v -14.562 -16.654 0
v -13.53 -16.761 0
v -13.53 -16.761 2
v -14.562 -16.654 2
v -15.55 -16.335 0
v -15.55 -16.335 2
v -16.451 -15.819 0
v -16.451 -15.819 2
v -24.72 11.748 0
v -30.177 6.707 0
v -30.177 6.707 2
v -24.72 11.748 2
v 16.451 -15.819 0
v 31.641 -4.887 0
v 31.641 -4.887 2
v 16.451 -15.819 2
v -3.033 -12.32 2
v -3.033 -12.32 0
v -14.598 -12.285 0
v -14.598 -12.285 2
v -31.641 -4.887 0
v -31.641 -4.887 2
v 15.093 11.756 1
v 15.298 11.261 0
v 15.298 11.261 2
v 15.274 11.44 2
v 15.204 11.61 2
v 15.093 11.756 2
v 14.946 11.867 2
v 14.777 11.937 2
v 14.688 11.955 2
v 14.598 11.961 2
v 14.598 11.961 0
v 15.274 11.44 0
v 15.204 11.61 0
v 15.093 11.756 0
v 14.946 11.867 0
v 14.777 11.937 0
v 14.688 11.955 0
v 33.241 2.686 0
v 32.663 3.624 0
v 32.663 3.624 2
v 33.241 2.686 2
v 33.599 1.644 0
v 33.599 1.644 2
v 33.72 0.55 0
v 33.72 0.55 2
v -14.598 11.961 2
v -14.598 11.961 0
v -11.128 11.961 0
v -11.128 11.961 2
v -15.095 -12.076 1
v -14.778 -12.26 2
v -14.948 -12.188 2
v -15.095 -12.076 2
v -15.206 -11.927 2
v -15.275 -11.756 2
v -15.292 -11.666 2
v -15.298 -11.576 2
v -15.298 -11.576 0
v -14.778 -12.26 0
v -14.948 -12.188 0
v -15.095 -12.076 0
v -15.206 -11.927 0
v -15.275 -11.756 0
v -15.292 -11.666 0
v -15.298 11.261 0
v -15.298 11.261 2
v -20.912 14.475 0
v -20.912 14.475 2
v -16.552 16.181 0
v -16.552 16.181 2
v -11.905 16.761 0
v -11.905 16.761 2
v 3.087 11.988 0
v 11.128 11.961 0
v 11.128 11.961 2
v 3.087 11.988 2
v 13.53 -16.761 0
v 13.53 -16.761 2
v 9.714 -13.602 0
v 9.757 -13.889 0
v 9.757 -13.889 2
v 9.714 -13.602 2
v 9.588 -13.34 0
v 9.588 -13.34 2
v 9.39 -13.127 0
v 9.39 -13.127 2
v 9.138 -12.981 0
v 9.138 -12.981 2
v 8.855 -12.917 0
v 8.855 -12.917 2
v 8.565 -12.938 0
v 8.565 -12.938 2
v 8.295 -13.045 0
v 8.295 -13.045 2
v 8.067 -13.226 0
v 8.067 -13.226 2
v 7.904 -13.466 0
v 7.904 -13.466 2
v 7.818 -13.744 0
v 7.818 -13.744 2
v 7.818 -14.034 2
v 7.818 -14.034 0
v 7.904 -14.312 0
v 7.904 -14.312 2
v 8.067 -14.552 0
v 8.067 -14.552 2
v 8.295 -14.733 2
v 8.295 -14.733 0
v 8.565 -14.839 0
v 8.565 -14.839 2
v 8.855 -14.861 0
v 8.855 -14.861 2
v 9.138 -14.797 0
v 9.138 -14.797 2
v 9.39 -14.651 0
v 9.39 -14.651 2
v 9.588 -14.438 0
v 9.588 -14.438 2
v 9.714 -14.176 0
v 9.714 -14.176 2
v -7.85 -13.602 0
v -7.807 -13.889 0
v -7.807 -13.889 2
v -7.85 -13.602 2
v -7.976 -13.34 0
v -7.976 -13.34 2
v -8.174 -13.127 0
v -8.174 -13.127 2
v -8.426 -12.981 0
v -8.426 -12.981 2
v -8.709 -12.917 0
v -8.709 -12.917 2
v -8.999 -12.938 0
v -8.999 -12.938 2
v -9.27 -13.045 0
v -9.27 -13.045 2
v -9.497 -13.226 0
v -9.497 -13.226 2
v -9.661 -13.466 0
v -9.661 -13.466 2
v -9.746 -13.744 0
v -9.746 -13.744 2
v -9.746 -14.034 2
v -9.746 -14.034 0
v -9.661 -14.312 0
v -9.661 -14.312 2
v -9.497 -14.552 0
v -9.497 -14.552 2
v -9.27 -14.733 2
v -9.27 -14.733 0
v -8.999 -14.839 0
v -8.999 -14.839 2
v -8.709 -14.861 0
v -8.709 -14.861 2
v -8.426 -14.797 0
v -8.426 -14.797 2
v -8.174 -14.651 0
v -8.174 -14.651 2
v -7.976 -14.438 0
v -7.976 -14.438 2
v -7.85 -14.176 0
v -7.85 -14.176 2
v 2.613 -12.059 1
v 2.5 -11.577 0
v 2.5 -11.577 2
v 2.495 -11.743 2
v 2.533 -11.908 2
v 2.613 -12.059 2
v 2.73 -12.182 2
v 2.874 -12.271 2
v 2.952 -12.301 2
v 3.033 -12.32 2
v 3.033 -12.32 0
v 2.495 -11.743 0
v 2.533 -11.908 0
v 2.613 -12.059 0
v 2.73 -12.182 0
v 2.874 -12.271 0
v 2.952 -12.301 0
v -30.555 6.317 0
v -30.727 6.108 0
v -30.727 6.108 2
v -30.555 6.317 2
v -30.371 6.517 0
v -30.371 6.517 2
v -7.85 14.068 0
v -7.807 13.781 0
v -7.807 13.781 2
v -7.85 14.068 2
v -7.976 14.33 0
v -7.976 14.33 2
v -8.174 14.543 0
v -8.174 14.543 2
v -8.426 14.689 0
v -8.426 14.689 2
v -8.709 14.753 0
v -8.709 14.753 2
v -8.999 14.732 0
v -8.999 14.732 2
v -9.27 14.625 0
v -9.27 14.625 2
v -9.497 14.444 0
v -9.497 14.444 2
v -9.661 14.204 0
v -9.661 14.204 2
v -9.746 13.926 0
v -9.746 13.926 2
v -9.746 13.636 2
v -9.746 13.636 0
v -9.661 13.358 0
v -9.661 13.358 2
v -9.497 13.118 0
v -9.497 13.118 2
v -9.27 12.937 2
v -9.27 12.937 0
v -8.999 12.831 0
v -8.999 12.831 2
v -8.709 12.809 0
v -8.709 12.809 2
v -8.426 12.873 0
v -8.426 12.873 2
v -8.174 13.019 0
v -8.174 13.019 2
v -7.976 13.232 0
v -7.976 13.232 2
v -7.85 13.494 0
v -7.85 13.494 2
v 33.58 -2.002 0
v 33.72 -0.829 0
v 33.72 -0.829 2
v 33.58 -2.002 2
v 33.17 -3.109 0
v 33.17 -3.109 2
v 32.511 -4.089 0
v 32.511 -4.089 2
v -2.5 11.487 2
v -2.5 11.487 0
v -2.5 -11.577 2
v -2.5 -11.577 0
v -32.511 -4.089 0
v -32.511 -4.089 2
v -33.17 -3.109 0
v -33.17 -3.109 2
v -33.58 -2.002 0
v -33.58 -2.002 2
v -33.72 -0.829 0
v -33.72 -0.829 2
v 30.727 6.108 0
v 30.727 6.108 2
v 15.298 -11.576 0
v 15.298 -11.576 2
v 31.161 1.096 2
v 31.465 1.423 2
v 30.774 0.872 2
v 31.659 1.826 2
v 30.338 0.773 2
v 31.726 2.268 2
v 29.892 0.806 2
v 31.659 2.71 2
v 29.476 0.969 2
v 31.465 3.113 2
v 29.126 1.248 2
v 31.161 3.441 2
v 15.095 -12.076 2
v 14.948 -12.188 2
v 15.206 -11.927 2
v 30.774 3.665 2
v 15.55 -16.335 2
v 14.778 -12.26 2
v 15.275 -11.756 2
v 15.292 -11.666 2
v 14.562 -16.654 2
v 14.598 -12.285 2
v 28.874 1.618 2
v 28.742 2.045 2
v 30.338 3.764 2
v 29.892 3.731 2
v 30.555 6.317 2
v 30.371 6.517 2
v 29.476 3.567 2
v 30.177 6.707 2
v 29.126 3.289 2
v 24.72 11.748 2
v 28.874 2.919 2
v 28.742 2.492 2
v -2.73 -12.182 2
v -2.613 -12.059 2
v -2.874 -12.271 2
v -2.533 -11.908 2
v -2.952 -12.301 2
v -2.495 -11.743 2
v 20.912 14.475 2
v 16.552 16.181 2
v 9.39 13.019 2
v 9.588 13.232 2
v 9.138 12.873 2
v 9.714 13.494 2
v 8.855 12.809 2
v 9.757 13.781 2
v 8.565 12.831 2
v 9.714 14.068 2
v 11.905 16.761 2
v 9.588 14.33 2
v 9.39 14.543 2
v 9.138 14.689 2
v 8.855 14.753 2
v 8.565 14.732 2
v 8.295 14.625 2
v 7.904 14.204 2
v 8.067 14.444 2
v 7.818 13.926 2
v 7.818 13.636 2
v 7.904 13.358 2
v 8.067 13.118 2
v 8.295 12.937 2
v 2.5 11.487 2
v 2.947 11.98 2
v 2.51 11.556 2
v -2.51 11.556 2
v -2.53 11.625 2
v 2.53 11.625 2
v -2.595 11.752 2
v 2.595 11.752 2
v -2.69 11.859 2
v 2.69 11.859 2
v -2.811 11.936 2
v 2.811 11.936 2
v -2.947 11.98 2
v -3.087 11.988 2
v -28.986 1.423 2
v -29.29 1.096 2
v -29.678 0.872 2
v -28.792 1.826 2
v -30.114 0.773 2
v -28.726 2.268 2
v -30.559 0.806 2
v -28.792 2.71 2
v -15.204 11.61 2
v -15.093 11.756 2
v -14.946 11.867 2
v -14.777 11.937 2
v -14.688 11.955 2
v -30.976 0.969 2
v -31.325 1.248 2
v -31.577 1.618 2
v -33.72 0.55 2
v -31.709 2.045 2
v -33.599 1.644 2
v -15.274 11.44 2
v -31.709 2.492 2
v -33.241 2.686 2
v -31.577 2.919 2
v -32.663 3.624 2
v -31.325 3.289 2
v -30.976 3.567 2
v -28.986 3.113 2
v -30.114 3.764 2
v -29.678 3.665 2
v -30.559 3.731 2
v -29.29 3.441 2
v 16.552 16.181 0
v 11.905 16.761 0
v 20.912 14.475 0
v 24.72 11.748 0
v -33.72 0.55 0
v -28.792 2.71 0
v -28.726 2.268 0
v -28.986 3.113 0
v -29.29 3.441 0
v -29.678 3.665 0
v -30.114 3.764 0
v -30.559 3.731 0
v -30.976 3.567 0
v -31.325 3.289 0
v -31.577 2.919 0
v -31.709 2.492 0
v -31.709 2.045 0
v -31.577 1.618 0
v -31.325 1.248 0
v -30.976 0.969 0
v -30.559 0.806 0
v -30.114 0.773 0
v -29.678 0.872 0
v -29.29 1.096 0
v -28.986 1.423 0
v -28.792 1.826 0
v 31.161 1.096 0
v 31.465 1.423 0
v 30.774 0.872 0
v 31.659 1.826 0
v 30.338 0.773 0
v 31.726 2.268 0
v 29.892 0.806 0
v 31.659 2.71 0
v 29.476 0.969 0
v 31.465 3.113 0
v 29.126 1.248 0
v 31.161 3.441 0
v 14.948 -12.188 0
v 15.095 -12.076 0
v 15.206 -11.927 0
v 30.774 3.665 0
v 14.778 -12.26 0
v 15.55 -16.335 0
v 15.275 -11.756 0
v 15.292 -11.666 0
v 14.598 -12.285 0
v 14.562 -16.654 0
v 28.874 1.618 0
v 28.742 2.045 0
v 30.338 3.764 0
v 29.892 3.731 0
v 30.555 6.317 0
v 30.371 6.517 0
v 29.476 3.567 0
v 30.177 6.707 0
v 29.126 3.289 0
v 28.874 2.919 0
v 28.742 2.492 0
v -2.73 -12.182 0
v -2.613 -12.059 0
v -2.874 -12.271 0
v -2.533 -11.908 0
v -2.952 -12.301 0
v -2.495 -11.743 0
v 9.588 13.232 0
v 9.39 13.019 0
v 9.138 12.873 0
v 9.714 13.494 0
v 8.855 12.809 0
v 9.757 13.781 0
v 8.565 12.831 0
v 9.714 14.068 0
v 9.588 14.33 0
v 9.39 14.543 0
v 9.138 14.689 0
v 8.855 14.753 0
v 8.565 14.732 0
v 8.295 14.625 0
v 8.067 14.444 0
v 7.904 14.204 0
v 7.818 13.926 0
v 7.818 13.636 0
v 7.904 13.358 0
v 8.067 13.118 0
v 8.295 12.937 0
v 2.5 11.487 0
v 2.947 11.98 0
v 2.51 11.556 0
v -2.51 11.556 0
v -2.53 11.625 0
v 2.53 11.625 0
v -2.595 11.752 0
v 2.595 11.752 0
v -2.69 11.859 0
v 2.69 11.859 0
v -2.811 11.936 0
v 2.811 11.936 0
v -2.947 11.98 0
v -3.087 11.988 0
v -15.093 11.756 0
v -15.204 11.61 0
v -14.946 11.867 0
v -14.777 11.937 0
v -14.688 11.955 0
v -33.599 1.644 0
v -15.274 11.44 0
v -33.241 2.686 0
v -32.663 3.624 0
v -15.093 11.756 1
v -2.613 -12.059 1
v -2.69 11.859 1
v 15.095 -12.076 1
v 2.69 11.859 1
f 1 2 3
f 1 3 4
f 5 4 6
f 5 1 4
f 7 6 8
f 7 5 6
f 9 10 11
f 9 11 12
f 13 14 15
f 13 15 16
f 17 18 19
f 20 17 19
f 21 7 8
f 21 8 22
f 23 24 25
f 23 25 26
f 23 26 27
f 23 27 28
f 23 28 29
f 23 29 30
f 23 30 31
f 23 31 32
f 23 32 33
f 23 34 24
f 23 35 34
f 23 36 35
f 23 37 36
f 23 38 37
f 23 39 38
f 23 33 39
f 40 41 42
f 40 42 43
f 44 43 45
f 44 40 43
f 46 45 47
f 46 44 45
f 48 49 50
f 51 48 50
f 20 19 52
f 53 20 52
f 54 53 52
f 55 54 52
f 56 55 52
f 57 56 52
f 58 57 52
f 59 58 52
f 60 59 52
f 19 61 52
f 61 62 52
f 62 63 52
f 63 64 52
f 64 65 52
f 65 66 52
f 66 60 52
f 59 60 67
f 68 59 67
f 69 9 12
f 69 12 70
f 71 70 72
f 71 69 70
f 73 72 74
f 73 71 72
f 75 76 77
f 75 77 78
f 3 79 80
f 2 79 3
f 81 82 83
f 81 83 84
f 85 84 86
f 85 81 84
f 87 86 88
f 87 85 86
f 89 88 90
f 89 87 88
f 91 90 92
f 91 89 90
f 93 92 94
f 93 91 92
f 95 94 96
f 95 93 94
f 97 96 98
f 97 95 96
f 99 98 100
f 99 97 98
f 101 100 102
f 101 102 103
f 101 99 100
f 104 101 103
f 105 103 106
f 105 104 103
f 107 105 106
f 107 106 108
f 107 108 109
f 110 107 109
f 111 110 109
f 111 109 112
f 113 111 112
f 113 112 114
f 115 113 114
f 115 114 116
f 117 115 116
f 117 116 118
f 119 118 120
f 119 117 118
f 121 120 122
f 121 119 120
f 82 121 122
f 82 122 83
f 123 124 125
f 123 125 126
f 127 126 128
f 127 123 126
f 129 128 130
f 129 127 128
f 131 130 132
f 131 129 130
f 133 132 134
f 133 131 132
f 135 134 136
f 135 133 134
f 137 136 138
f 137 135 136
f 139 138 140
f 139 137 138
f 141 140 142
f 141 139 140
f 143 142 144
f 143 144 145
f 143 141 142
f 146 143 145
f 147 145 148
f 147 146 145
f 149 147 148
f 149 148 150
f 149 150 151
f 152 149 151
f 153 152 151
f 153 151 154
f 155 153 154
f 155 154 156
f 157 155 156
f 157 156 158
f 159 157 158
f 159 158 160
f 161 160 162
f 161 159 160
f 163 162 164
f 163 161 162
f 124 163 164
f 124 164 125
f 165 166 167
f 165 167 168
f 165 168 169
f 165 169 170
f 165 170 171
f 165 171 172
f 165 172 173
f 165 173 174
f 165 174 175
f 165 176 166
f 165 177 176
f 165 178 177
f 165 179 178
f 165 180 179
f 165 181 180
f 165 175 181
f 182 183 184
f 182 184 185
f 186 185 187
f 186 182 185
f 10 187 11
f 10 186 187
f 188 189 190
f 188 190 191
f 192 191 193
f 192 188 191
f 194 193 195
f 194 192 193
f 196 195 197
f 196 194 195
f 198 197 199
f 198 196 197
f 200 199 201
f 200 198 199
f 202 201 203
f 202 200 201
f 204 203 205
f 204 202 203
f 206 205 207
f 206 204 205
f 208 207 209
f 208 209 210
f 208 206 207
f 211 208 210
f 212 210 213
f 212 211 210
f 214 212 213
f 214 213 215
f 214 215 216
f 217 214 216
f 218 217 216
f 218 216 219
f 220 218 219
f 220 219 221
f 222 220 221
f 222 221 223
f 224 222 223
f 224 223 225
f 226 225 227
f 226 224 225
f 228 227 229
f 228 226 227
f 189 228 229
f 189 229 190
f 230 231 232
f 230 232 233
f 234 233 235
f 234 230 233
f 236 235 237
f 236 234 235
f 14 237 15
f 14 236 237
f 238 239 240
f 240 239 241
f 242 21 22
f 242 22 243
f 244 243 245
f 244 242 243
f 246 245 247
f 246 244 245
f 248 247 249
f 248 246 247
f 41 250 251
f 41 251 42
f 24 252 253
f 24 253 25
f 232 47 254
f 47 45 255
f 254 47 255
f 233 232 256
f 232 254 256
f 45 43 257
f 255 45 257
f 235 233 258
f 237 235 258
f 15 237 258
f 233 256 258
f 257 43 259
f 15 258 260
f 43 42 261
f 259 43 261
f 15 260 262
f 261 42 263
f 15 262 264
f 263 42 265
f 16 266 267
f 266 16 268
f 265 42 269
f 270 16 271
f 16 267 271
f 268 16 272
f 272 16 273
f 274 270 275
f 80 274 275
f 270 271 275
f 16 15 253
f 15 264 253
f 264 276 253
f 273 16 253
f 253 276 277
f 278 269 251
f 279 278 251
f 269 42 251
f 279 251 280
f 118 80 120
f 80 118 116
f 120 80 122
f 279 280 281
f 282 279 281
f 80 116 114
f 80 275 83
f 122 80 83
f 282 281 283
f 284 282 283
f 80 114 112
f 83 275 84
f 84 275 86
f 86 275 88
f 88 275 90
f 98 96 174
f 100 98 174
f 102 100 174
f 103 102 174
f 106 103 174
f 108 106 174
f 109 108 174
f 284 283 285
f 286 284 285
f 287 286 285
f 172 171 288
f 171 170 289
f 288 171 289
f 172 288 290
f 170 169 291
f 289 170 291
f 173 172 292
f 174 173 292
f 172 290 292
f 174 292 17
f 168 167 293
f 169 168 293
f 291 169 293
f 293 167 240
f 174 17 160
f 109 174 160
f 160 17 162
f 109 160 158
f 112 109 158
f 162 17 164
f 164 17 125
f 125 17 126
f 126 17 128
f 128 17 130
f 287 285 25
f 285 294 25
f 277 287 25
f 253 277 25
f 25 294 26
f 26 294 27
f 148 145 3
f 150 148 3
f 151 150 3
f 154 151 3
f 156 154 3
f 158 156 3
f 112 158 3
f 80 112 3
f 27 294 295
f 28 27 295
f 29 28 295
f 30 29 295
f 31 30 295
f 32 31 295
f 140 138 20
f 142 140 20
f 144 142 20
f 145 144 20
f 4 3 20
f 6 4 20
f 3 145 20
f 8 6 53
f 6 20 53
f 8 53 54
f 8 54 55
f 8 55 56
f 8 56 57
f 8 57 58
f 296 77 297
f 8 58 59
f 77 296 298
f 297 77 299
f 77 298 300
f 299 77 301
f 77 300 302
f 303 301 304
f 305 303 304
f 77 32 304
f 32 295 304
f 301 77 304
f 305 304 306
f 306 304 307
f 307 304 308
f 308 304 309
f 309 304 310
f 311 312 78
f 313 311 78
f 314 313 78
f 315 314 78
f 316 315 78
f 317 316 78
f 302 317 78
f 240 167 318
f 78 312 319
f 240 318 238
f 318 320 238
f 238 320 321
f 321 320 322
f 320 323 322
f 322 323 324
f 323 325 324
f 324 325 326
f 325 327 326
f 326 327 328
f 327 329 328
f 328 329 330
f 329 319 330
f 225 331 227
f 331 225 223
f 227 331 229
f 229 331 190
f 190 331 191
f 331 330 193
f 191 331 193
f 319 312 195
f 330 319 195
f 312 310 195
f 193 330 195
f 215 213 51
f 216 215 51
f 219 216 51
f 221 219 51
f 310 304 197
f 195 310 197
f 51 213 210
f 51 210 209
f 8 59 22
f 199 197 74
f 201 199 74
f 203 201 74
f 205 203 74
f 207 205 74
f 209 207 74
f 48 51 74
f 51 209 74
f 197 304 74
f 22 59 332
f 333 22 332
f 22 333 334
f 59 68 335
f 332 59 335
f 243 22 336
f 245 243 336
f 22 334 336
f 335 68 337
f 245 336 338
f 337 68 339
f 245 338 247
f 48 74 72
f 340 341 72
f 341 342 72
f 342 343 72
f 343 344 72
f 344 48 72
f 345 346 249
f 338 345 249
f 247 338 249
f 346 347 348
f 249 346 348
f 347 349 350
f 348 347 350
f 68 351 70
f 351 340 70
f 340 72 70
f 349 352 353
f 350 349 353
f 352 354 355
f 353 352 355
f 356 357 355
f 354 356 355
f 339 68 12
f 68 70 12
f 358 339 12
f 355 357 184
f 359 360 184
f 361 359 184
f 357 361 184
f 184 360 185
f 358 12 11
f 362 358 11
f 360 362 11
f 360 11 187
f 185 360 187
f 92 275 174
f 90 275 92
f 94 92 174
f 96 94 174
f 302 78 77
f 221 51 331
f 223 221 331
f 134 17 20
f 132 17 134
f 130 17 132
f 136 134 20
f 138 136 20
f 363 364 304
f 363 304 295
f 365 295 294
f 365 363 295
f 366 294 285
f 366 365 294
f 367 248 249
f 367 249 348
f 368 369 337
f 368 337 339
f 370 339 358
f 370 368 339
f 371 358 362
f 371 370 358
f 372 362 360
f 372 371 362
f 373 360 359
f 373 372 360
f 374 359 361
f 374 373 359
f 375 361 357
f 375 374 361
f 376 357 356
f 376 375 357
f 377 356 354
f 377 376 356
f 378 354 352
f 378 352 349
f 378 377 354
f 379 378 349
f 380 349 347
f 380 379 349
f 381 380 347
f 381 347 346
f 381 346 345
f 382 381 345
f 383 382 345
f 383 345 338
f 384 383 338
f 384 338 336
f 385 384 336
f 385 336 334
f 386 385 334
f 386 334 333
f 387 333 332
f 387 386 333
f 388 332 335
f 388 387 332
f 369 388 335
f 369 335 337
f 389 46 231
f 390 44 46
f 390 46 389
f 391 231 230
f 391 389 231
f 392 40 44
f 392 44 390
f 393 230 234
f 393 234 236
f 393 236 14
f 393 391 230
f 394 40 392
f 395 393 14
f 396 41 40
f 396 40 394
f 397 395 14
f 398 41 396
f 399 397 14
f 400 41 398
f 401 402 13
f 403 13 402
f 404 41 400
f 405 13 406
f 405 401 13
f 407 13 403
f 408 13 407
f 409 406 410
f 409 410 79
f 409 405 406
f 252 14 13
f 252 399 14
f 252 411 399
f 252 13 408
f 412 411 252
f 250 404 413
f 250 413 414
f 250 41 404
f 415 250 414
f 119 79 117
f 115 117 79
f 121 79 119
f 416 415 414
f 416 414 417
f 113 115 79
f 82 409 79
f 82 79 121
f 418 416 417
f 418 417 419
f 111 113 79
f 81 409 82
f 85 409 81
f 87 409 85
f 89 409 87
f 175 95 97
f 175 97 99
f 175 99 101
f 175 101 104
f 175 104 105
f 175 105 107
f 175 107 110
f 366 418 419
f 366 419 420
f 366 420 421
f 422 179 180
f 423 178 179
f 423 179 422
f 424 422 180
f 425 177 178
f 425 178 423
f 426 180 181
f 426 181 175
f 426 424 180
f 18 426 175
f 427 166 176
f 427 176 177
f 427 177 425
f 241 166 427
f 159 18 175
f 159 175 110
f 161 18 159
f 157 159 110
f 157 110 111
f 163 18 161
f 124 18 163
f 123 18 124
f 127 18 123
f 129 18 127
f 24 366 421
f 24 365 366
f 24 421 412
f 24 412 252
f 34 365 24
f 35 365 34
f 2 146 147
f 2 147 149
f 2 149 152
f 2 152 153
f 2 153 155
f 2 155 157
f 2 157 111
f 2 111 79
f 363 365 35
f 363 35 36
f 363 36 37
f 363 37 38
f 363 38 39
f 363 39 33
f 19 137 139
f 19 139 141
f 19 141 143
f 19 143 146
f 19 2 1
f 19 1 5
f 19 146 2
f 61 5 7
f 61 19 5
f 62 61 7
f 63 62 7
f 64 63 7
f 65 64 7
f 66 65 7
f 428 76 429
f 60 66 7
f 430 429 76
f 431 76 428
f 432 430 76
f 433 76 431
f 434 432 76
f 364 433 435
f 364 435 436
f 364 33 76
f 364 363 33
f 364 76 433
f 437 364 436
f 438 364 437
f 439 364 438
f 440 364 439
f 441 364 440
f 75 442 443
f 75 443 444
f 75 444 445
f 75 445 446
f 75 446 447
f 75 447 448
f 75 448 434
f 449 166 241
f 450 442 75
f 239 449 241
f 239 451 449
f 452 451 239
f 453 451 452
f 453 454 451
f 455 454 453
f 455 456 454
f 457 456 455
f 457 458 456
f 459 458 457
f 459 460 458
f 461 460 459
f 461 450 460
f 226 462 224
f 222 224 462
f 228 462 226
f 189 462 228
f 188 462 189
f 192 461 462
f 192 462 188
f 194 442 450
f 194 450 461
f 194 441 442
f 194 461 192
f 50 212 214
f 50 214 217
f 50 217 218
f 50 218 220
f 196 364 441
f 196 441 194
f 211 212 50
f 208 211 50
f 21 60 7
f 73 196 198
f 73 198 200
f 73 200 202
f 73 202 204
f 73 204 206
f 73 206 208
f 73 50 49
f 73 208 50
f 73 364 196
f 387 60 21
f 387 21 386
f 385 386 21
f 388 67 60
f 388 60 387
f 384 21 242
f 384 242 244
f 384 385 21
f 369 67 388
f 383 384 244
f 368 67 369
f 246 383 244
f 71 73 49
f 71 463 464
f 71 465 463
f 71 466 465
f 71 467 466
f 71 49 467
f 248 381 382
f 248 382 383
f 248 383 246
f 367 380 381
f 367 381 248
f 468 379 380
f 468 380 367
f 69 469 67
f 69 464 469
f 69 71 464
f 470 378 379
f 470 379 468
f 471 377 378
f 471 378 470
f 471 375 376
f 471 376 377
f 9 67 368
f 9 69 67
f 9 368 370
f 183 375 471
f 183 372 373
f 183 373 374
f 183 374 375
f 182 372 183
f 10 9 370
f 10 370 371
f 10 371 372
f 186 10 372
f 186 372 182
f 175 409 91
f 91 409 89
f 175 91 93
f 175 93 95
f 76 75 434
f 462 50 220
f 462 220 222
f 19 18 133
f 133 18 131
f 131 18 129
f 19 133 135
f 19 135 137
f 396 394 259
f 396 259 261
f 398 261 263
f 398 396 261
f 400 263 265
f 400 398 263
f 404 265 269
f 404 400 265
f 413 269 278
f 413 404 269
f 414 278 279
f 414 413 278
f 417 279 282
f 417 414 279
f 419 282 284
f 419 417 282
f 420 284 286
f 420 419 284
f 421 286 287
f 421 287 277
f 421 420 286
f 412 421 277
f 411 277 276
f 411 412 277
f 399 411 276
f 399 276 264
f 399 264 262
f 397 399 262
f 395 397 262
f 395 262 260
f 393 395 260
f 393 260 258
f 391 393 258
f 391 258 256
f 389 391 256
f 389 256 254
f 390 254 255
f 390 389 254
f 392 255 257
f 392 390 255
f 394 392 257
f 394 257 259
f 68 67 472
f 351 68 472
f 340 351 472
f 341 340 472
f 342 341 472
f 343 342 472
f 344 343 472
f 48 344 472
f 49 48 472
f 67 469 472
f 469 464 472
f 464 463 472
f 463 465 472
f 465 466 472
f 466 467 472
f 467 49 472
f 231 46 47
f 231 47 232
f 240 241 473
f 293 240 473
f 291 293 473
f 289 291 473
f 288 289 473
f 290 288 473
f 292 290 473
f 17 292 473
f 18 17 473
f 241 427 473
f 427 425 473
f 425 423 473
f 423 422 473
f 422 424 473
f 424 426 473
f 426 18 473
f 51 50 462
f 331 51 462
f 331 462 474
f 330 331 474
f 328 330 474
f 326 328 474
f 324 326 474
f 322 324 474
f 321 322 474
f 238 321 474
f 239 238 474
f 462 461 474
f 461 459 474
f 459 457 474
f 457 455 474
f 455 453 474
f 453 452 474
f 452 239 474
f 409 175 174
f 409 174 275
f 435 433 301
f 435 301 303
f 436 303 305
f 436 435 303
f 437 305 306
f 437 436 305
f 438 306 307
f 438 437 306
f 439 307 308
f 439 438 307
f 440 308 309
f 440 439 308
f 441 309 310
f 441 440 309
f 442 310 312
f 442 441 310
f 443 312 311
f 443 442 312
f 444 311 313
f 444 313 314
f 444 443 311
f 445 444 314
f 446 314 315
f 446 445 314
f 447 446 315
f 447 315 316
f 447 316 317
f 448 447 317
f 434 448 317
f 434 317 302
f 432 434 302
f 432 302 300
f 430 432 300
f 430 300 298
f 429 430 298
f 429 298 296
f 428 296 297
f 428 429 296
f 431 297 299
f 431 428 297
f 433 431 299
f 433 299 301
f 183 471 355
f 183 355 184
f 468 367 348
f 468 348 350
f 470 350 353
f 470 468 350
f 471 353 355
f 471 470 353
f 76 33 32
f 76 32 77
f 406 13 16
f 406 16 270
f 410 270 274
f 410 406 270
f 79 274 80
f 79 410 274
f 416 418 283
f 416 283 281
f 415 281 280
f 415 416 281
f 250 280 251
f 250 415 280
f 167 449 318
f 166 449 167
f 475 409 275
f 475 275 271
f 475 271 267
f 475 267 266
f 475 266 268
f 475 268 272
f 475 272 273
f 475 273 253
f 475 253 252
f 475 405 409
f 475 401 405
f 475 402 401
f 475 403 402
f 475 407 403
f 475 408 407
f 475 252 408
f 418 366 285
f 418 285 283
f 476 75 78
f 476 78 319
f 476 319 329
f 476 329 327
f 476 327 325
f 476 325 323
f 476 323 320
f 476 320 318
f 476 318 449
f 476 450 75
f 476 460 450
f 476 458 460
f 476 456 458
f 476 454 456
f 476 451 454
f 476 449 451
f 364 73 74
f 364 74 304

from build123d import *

# Parameters (mm, degrees)
ESQUISSE1_R             = 1.5
ESQUISSE1_R_2           = 0.975
BOSS_EXTRU_3_DEPTH      = 2
ESQUISSE2_R             = 1.5
ENL_V_MAT_EXTRU_1_DEPTH = 10


with BuildPart() as part:
    # Esquisse1 → Boss.-Extru.3 (new body)
    with BuildSketch(Plane.XY):
        with BuildLine():
            Line((31.640550531, -4.887241018), (16.450544828, -15.819470843))
            ThreePointArc((16.450544828, -15.819470843), (15.064222472, -16.51996197), (13.529826111, -16.761219719))
            Line((13.529826111, -16.761219719), (-13.529826111, -16.761219719))
            ThreePointArc((-13.529826111, -16.761219719), (-15.064222472, -16.51996197), (-16.450544828, -15.819470843))
            Line((-16.450544828, -15.819470843), (-31.640550531, -4.887241018))
            ThreePointArc((-31.640550531, -4.887241018), (-33.169752802, -3.108946738), (-33.719831815, -0.828989895))
            Line((-33.719831815, -0.828989895), (-33.719831815, 0.549989061))
            ThreePointArc((-33.719831815, 0.549989061), (-33.448369589, 2.175083064), (-32.663459607, 3.623716413))
            Line((-32.663459607, 3.623716413), (-30.727499402, 6.107575779))
            ThreePointArc((-30.727499402, 6.107575779), (-30.464326323, 6.418261685), (-30.17674656, 6.706504084))
            Line((-30.17674656, 6.706504084), (-24.719522272, 11.748000297))
            ThreePointArc((-24.719522272, 11.748000297), (-18.785145606, 15.463312907), (-11.905042981, 16.761219719))
            Line((-11.905042981, 16.761219719), (11.905042981, 16.761219719))
            ThreePointArc((11.905042981, 16.761219719), (18.785145606, 15.463312907), (24.719522272, 11.748000297))
            Line((24.719522272, 11.748000297), (30.17674656, 6.706504084))
            ThreePointArc((30.17674656, 6.706504084), (30.464326323, 6.418261685), (30.727499402, 6.107575779))
            Line((30.727499402, 6.107575779), (32.663459607, 3.623716413))
            ThreePointArc((32.663459607, 3.623716413), (33.448369589, 2.175083064), (33.719831815, 0.549989061))
            Line((33.719831815, 0.549989061), (33.719831815, -0.828989895))
            ThreePointArc((33.719831815, -0.828989895), (33.169752802, -3.108946738), (31.640550531, -4.887241018))
        make_face()
        with Locations((-30.225692015, 2.268354752)):
            Circle(ESQUISSE1_R, mode=Mode.SUBTRACT)
        with Locations((-8.782063878, 13.78106332)):
            Circle(ESQUISSE1_R_2, mode=Mode.SUBTRACT)
        with Locations((-8.782063878, -13.88893668)):
            Circle(ESQUISSE1_R_2, mode=Mode.SUBTRACT)
        with Locations((8.782063878, -13.88893668)):
            Circle(ESQUISSE1_R_2, mode=Mode.SUBTRACT)
        with Locations((8.782063878, 13.78106332)):
            Circle(ESQUISSE1_R_2, mode=Mode.SUBTRACT)
        with Locations((30.225692015, 2.268354752)):
            Circle(ESQUISSE1_R, mode=Mode.SUBTRACT)
        with BuildLine():
            Line((-2.5, 11.487169319), (-2.5, -11.576554556))
            add(Edge.make_bspline(
                [(-2.5, -11.576554556), (-2.473208566, -11.739357127), (-2.553615023, -12.100978181), (-2.87033079, -12.292815757), (-3.033099085, -12.319601551)],
                knots=[0, 0, 0, 0, 0.785398163, 1.570796327, 1.570796327, 1.570796327, 1.570796327], degree=3))
            Line((-3.033099085, -12.319601551), (-14.597943906, -12.285266489))
            add(Edge.make_bspline(
                [(-14.597943906, -12.285266489), (-14.777700694, -12.284097516), (-15.151218557, -12.131430398), (-15.299227824, -11.755845667), (-15.298058605, -11.576051026)],
                knots=[1.570796327, 1.570796327, 1.570796327, 1.570796327, 2.35619449, 3.141592654, 3.141592654, 3.141592654, 3.141592654], degree=3))
            Line((-15.298058605, -11.576051026), (-15.298037902, 11.261063321))
            add(Edge.make_bspline(
                [(-15.298037902, 11.261063321), (-15.29803156, 11.4396883), (-15.148551709, 11.811852348), (-14.776487869, 11.961093545), (-14.597900496, 11.961087204)],
                knots=[0, 0, 0, 0, 0.785398163, 1.570796327, 1.570796327, 1.570796327, 1.570796327], degree=3))
            Line((-14.597900496, 11.961087204), (-11.128260179, 11.961087204))
            Line((-11.128260179, 11.961087204), (-3.087360016, 11.987859762))
            add(Edge.make_bspline(
                [(-3.087360016, 11.987859762), (-2.948581163, 11.998907943), (-2.650223858, 11.905940648), (-2.511050508, 11.625977396), (-2.5, 11.487169319)],
                knots=[1.570796327, 1.570796327, 1.570796327, 1.570796327, 2.35619449, 3.141592654, 3.141592654, 3.141592654, 3.141592654], degree=3))
        make_face(mode=Mode.SUBTRACT)
        with BuildLine():
            Line((3.033099085, -12.319601551), (14.597943906, -12.285266489))
            add(Edge.make_bspline(
                [(14.597943906, -12.285266489), (14.777700694, -12.284097516), (15.151218557, -12.131430398), (15.299227824, -11.755845667), (15.298058605, -11.576051026)],
                knots=[1.570796327, 1.570796327, 1.570796327, 1.570796327, 2.35619449, 3.141592654, 3.141592654, 3.141592654, 3.141592654], degree=3))
            Line((15.298058605, -11.576051026), (15.298037902, 11.261063321))
            add(Edge.make_bspline(
                [(15.298037902, 11.261063321), (15.29803156, 11.4396883), (15.148551709, 11.811852348), (14.776487869, 11.961093545), (14.597900496, 11.961087204)],
                knots=[0, 0, 0, 0, 0.785398163, 1.570796327, 1.570796327, 1.570796327, 1.570796327], degree=3))
            Line((14.597900496, 11.961087204), (11.128260179, 11.961087204))
            Line((11.128260179, 11.961087204), (3.087360016, 11.987859762))
            add(Edge.make_bspline(
                [(3.087360016, 11.987859762), (2.948581163, 11.998907943), (2.650223858, 11.905940648), (2.511050508, 11.625977396), (2.5, 11.487169319)],
                knots=[1.570796327, 1.570796327, 1.570796327, 1.570796327, 2.35619449, 3.141592654, 3.141592654, 3.141592654, 3.141592654], degree=3))
            Line((2.5, 11.487169319), (2.5, -11.576554556))
            add(Edge.make_bspline(
                [(2.5, -11.576554556), (2.473208566, -11.739357127), (2.553615023, -12.100978181), (2.87033079, -12.292815757), (3.033099085, -12.319601551)],
                knots=[0, 0, 0, 0, 0.785398163, 1.570796327, 1.570796327, 1.570796327, 1.570796327], degree=3))
        make_face(mode=Mode.SUBTRACT)
    extrude(amount=BOSS_EXTRU_3_DEPTH)

    # Esquisse2 → Enlèv. mat.-Extru.1 (cut)
    with BuildSketch(Plane.XY.offset(2)):
        with Locations((29.955535999, 19.762236701)):
            Circle(ESQUISSE2_R)
        with Locations((-60.239561974, 19.762236701)):
            Circle(ESQUISSE2_R)
    extrude(amount=-ENL_V_MAT_EXTRU_1_DEPTH, mode=Mode.SUBTRACT)


solid = part.part
